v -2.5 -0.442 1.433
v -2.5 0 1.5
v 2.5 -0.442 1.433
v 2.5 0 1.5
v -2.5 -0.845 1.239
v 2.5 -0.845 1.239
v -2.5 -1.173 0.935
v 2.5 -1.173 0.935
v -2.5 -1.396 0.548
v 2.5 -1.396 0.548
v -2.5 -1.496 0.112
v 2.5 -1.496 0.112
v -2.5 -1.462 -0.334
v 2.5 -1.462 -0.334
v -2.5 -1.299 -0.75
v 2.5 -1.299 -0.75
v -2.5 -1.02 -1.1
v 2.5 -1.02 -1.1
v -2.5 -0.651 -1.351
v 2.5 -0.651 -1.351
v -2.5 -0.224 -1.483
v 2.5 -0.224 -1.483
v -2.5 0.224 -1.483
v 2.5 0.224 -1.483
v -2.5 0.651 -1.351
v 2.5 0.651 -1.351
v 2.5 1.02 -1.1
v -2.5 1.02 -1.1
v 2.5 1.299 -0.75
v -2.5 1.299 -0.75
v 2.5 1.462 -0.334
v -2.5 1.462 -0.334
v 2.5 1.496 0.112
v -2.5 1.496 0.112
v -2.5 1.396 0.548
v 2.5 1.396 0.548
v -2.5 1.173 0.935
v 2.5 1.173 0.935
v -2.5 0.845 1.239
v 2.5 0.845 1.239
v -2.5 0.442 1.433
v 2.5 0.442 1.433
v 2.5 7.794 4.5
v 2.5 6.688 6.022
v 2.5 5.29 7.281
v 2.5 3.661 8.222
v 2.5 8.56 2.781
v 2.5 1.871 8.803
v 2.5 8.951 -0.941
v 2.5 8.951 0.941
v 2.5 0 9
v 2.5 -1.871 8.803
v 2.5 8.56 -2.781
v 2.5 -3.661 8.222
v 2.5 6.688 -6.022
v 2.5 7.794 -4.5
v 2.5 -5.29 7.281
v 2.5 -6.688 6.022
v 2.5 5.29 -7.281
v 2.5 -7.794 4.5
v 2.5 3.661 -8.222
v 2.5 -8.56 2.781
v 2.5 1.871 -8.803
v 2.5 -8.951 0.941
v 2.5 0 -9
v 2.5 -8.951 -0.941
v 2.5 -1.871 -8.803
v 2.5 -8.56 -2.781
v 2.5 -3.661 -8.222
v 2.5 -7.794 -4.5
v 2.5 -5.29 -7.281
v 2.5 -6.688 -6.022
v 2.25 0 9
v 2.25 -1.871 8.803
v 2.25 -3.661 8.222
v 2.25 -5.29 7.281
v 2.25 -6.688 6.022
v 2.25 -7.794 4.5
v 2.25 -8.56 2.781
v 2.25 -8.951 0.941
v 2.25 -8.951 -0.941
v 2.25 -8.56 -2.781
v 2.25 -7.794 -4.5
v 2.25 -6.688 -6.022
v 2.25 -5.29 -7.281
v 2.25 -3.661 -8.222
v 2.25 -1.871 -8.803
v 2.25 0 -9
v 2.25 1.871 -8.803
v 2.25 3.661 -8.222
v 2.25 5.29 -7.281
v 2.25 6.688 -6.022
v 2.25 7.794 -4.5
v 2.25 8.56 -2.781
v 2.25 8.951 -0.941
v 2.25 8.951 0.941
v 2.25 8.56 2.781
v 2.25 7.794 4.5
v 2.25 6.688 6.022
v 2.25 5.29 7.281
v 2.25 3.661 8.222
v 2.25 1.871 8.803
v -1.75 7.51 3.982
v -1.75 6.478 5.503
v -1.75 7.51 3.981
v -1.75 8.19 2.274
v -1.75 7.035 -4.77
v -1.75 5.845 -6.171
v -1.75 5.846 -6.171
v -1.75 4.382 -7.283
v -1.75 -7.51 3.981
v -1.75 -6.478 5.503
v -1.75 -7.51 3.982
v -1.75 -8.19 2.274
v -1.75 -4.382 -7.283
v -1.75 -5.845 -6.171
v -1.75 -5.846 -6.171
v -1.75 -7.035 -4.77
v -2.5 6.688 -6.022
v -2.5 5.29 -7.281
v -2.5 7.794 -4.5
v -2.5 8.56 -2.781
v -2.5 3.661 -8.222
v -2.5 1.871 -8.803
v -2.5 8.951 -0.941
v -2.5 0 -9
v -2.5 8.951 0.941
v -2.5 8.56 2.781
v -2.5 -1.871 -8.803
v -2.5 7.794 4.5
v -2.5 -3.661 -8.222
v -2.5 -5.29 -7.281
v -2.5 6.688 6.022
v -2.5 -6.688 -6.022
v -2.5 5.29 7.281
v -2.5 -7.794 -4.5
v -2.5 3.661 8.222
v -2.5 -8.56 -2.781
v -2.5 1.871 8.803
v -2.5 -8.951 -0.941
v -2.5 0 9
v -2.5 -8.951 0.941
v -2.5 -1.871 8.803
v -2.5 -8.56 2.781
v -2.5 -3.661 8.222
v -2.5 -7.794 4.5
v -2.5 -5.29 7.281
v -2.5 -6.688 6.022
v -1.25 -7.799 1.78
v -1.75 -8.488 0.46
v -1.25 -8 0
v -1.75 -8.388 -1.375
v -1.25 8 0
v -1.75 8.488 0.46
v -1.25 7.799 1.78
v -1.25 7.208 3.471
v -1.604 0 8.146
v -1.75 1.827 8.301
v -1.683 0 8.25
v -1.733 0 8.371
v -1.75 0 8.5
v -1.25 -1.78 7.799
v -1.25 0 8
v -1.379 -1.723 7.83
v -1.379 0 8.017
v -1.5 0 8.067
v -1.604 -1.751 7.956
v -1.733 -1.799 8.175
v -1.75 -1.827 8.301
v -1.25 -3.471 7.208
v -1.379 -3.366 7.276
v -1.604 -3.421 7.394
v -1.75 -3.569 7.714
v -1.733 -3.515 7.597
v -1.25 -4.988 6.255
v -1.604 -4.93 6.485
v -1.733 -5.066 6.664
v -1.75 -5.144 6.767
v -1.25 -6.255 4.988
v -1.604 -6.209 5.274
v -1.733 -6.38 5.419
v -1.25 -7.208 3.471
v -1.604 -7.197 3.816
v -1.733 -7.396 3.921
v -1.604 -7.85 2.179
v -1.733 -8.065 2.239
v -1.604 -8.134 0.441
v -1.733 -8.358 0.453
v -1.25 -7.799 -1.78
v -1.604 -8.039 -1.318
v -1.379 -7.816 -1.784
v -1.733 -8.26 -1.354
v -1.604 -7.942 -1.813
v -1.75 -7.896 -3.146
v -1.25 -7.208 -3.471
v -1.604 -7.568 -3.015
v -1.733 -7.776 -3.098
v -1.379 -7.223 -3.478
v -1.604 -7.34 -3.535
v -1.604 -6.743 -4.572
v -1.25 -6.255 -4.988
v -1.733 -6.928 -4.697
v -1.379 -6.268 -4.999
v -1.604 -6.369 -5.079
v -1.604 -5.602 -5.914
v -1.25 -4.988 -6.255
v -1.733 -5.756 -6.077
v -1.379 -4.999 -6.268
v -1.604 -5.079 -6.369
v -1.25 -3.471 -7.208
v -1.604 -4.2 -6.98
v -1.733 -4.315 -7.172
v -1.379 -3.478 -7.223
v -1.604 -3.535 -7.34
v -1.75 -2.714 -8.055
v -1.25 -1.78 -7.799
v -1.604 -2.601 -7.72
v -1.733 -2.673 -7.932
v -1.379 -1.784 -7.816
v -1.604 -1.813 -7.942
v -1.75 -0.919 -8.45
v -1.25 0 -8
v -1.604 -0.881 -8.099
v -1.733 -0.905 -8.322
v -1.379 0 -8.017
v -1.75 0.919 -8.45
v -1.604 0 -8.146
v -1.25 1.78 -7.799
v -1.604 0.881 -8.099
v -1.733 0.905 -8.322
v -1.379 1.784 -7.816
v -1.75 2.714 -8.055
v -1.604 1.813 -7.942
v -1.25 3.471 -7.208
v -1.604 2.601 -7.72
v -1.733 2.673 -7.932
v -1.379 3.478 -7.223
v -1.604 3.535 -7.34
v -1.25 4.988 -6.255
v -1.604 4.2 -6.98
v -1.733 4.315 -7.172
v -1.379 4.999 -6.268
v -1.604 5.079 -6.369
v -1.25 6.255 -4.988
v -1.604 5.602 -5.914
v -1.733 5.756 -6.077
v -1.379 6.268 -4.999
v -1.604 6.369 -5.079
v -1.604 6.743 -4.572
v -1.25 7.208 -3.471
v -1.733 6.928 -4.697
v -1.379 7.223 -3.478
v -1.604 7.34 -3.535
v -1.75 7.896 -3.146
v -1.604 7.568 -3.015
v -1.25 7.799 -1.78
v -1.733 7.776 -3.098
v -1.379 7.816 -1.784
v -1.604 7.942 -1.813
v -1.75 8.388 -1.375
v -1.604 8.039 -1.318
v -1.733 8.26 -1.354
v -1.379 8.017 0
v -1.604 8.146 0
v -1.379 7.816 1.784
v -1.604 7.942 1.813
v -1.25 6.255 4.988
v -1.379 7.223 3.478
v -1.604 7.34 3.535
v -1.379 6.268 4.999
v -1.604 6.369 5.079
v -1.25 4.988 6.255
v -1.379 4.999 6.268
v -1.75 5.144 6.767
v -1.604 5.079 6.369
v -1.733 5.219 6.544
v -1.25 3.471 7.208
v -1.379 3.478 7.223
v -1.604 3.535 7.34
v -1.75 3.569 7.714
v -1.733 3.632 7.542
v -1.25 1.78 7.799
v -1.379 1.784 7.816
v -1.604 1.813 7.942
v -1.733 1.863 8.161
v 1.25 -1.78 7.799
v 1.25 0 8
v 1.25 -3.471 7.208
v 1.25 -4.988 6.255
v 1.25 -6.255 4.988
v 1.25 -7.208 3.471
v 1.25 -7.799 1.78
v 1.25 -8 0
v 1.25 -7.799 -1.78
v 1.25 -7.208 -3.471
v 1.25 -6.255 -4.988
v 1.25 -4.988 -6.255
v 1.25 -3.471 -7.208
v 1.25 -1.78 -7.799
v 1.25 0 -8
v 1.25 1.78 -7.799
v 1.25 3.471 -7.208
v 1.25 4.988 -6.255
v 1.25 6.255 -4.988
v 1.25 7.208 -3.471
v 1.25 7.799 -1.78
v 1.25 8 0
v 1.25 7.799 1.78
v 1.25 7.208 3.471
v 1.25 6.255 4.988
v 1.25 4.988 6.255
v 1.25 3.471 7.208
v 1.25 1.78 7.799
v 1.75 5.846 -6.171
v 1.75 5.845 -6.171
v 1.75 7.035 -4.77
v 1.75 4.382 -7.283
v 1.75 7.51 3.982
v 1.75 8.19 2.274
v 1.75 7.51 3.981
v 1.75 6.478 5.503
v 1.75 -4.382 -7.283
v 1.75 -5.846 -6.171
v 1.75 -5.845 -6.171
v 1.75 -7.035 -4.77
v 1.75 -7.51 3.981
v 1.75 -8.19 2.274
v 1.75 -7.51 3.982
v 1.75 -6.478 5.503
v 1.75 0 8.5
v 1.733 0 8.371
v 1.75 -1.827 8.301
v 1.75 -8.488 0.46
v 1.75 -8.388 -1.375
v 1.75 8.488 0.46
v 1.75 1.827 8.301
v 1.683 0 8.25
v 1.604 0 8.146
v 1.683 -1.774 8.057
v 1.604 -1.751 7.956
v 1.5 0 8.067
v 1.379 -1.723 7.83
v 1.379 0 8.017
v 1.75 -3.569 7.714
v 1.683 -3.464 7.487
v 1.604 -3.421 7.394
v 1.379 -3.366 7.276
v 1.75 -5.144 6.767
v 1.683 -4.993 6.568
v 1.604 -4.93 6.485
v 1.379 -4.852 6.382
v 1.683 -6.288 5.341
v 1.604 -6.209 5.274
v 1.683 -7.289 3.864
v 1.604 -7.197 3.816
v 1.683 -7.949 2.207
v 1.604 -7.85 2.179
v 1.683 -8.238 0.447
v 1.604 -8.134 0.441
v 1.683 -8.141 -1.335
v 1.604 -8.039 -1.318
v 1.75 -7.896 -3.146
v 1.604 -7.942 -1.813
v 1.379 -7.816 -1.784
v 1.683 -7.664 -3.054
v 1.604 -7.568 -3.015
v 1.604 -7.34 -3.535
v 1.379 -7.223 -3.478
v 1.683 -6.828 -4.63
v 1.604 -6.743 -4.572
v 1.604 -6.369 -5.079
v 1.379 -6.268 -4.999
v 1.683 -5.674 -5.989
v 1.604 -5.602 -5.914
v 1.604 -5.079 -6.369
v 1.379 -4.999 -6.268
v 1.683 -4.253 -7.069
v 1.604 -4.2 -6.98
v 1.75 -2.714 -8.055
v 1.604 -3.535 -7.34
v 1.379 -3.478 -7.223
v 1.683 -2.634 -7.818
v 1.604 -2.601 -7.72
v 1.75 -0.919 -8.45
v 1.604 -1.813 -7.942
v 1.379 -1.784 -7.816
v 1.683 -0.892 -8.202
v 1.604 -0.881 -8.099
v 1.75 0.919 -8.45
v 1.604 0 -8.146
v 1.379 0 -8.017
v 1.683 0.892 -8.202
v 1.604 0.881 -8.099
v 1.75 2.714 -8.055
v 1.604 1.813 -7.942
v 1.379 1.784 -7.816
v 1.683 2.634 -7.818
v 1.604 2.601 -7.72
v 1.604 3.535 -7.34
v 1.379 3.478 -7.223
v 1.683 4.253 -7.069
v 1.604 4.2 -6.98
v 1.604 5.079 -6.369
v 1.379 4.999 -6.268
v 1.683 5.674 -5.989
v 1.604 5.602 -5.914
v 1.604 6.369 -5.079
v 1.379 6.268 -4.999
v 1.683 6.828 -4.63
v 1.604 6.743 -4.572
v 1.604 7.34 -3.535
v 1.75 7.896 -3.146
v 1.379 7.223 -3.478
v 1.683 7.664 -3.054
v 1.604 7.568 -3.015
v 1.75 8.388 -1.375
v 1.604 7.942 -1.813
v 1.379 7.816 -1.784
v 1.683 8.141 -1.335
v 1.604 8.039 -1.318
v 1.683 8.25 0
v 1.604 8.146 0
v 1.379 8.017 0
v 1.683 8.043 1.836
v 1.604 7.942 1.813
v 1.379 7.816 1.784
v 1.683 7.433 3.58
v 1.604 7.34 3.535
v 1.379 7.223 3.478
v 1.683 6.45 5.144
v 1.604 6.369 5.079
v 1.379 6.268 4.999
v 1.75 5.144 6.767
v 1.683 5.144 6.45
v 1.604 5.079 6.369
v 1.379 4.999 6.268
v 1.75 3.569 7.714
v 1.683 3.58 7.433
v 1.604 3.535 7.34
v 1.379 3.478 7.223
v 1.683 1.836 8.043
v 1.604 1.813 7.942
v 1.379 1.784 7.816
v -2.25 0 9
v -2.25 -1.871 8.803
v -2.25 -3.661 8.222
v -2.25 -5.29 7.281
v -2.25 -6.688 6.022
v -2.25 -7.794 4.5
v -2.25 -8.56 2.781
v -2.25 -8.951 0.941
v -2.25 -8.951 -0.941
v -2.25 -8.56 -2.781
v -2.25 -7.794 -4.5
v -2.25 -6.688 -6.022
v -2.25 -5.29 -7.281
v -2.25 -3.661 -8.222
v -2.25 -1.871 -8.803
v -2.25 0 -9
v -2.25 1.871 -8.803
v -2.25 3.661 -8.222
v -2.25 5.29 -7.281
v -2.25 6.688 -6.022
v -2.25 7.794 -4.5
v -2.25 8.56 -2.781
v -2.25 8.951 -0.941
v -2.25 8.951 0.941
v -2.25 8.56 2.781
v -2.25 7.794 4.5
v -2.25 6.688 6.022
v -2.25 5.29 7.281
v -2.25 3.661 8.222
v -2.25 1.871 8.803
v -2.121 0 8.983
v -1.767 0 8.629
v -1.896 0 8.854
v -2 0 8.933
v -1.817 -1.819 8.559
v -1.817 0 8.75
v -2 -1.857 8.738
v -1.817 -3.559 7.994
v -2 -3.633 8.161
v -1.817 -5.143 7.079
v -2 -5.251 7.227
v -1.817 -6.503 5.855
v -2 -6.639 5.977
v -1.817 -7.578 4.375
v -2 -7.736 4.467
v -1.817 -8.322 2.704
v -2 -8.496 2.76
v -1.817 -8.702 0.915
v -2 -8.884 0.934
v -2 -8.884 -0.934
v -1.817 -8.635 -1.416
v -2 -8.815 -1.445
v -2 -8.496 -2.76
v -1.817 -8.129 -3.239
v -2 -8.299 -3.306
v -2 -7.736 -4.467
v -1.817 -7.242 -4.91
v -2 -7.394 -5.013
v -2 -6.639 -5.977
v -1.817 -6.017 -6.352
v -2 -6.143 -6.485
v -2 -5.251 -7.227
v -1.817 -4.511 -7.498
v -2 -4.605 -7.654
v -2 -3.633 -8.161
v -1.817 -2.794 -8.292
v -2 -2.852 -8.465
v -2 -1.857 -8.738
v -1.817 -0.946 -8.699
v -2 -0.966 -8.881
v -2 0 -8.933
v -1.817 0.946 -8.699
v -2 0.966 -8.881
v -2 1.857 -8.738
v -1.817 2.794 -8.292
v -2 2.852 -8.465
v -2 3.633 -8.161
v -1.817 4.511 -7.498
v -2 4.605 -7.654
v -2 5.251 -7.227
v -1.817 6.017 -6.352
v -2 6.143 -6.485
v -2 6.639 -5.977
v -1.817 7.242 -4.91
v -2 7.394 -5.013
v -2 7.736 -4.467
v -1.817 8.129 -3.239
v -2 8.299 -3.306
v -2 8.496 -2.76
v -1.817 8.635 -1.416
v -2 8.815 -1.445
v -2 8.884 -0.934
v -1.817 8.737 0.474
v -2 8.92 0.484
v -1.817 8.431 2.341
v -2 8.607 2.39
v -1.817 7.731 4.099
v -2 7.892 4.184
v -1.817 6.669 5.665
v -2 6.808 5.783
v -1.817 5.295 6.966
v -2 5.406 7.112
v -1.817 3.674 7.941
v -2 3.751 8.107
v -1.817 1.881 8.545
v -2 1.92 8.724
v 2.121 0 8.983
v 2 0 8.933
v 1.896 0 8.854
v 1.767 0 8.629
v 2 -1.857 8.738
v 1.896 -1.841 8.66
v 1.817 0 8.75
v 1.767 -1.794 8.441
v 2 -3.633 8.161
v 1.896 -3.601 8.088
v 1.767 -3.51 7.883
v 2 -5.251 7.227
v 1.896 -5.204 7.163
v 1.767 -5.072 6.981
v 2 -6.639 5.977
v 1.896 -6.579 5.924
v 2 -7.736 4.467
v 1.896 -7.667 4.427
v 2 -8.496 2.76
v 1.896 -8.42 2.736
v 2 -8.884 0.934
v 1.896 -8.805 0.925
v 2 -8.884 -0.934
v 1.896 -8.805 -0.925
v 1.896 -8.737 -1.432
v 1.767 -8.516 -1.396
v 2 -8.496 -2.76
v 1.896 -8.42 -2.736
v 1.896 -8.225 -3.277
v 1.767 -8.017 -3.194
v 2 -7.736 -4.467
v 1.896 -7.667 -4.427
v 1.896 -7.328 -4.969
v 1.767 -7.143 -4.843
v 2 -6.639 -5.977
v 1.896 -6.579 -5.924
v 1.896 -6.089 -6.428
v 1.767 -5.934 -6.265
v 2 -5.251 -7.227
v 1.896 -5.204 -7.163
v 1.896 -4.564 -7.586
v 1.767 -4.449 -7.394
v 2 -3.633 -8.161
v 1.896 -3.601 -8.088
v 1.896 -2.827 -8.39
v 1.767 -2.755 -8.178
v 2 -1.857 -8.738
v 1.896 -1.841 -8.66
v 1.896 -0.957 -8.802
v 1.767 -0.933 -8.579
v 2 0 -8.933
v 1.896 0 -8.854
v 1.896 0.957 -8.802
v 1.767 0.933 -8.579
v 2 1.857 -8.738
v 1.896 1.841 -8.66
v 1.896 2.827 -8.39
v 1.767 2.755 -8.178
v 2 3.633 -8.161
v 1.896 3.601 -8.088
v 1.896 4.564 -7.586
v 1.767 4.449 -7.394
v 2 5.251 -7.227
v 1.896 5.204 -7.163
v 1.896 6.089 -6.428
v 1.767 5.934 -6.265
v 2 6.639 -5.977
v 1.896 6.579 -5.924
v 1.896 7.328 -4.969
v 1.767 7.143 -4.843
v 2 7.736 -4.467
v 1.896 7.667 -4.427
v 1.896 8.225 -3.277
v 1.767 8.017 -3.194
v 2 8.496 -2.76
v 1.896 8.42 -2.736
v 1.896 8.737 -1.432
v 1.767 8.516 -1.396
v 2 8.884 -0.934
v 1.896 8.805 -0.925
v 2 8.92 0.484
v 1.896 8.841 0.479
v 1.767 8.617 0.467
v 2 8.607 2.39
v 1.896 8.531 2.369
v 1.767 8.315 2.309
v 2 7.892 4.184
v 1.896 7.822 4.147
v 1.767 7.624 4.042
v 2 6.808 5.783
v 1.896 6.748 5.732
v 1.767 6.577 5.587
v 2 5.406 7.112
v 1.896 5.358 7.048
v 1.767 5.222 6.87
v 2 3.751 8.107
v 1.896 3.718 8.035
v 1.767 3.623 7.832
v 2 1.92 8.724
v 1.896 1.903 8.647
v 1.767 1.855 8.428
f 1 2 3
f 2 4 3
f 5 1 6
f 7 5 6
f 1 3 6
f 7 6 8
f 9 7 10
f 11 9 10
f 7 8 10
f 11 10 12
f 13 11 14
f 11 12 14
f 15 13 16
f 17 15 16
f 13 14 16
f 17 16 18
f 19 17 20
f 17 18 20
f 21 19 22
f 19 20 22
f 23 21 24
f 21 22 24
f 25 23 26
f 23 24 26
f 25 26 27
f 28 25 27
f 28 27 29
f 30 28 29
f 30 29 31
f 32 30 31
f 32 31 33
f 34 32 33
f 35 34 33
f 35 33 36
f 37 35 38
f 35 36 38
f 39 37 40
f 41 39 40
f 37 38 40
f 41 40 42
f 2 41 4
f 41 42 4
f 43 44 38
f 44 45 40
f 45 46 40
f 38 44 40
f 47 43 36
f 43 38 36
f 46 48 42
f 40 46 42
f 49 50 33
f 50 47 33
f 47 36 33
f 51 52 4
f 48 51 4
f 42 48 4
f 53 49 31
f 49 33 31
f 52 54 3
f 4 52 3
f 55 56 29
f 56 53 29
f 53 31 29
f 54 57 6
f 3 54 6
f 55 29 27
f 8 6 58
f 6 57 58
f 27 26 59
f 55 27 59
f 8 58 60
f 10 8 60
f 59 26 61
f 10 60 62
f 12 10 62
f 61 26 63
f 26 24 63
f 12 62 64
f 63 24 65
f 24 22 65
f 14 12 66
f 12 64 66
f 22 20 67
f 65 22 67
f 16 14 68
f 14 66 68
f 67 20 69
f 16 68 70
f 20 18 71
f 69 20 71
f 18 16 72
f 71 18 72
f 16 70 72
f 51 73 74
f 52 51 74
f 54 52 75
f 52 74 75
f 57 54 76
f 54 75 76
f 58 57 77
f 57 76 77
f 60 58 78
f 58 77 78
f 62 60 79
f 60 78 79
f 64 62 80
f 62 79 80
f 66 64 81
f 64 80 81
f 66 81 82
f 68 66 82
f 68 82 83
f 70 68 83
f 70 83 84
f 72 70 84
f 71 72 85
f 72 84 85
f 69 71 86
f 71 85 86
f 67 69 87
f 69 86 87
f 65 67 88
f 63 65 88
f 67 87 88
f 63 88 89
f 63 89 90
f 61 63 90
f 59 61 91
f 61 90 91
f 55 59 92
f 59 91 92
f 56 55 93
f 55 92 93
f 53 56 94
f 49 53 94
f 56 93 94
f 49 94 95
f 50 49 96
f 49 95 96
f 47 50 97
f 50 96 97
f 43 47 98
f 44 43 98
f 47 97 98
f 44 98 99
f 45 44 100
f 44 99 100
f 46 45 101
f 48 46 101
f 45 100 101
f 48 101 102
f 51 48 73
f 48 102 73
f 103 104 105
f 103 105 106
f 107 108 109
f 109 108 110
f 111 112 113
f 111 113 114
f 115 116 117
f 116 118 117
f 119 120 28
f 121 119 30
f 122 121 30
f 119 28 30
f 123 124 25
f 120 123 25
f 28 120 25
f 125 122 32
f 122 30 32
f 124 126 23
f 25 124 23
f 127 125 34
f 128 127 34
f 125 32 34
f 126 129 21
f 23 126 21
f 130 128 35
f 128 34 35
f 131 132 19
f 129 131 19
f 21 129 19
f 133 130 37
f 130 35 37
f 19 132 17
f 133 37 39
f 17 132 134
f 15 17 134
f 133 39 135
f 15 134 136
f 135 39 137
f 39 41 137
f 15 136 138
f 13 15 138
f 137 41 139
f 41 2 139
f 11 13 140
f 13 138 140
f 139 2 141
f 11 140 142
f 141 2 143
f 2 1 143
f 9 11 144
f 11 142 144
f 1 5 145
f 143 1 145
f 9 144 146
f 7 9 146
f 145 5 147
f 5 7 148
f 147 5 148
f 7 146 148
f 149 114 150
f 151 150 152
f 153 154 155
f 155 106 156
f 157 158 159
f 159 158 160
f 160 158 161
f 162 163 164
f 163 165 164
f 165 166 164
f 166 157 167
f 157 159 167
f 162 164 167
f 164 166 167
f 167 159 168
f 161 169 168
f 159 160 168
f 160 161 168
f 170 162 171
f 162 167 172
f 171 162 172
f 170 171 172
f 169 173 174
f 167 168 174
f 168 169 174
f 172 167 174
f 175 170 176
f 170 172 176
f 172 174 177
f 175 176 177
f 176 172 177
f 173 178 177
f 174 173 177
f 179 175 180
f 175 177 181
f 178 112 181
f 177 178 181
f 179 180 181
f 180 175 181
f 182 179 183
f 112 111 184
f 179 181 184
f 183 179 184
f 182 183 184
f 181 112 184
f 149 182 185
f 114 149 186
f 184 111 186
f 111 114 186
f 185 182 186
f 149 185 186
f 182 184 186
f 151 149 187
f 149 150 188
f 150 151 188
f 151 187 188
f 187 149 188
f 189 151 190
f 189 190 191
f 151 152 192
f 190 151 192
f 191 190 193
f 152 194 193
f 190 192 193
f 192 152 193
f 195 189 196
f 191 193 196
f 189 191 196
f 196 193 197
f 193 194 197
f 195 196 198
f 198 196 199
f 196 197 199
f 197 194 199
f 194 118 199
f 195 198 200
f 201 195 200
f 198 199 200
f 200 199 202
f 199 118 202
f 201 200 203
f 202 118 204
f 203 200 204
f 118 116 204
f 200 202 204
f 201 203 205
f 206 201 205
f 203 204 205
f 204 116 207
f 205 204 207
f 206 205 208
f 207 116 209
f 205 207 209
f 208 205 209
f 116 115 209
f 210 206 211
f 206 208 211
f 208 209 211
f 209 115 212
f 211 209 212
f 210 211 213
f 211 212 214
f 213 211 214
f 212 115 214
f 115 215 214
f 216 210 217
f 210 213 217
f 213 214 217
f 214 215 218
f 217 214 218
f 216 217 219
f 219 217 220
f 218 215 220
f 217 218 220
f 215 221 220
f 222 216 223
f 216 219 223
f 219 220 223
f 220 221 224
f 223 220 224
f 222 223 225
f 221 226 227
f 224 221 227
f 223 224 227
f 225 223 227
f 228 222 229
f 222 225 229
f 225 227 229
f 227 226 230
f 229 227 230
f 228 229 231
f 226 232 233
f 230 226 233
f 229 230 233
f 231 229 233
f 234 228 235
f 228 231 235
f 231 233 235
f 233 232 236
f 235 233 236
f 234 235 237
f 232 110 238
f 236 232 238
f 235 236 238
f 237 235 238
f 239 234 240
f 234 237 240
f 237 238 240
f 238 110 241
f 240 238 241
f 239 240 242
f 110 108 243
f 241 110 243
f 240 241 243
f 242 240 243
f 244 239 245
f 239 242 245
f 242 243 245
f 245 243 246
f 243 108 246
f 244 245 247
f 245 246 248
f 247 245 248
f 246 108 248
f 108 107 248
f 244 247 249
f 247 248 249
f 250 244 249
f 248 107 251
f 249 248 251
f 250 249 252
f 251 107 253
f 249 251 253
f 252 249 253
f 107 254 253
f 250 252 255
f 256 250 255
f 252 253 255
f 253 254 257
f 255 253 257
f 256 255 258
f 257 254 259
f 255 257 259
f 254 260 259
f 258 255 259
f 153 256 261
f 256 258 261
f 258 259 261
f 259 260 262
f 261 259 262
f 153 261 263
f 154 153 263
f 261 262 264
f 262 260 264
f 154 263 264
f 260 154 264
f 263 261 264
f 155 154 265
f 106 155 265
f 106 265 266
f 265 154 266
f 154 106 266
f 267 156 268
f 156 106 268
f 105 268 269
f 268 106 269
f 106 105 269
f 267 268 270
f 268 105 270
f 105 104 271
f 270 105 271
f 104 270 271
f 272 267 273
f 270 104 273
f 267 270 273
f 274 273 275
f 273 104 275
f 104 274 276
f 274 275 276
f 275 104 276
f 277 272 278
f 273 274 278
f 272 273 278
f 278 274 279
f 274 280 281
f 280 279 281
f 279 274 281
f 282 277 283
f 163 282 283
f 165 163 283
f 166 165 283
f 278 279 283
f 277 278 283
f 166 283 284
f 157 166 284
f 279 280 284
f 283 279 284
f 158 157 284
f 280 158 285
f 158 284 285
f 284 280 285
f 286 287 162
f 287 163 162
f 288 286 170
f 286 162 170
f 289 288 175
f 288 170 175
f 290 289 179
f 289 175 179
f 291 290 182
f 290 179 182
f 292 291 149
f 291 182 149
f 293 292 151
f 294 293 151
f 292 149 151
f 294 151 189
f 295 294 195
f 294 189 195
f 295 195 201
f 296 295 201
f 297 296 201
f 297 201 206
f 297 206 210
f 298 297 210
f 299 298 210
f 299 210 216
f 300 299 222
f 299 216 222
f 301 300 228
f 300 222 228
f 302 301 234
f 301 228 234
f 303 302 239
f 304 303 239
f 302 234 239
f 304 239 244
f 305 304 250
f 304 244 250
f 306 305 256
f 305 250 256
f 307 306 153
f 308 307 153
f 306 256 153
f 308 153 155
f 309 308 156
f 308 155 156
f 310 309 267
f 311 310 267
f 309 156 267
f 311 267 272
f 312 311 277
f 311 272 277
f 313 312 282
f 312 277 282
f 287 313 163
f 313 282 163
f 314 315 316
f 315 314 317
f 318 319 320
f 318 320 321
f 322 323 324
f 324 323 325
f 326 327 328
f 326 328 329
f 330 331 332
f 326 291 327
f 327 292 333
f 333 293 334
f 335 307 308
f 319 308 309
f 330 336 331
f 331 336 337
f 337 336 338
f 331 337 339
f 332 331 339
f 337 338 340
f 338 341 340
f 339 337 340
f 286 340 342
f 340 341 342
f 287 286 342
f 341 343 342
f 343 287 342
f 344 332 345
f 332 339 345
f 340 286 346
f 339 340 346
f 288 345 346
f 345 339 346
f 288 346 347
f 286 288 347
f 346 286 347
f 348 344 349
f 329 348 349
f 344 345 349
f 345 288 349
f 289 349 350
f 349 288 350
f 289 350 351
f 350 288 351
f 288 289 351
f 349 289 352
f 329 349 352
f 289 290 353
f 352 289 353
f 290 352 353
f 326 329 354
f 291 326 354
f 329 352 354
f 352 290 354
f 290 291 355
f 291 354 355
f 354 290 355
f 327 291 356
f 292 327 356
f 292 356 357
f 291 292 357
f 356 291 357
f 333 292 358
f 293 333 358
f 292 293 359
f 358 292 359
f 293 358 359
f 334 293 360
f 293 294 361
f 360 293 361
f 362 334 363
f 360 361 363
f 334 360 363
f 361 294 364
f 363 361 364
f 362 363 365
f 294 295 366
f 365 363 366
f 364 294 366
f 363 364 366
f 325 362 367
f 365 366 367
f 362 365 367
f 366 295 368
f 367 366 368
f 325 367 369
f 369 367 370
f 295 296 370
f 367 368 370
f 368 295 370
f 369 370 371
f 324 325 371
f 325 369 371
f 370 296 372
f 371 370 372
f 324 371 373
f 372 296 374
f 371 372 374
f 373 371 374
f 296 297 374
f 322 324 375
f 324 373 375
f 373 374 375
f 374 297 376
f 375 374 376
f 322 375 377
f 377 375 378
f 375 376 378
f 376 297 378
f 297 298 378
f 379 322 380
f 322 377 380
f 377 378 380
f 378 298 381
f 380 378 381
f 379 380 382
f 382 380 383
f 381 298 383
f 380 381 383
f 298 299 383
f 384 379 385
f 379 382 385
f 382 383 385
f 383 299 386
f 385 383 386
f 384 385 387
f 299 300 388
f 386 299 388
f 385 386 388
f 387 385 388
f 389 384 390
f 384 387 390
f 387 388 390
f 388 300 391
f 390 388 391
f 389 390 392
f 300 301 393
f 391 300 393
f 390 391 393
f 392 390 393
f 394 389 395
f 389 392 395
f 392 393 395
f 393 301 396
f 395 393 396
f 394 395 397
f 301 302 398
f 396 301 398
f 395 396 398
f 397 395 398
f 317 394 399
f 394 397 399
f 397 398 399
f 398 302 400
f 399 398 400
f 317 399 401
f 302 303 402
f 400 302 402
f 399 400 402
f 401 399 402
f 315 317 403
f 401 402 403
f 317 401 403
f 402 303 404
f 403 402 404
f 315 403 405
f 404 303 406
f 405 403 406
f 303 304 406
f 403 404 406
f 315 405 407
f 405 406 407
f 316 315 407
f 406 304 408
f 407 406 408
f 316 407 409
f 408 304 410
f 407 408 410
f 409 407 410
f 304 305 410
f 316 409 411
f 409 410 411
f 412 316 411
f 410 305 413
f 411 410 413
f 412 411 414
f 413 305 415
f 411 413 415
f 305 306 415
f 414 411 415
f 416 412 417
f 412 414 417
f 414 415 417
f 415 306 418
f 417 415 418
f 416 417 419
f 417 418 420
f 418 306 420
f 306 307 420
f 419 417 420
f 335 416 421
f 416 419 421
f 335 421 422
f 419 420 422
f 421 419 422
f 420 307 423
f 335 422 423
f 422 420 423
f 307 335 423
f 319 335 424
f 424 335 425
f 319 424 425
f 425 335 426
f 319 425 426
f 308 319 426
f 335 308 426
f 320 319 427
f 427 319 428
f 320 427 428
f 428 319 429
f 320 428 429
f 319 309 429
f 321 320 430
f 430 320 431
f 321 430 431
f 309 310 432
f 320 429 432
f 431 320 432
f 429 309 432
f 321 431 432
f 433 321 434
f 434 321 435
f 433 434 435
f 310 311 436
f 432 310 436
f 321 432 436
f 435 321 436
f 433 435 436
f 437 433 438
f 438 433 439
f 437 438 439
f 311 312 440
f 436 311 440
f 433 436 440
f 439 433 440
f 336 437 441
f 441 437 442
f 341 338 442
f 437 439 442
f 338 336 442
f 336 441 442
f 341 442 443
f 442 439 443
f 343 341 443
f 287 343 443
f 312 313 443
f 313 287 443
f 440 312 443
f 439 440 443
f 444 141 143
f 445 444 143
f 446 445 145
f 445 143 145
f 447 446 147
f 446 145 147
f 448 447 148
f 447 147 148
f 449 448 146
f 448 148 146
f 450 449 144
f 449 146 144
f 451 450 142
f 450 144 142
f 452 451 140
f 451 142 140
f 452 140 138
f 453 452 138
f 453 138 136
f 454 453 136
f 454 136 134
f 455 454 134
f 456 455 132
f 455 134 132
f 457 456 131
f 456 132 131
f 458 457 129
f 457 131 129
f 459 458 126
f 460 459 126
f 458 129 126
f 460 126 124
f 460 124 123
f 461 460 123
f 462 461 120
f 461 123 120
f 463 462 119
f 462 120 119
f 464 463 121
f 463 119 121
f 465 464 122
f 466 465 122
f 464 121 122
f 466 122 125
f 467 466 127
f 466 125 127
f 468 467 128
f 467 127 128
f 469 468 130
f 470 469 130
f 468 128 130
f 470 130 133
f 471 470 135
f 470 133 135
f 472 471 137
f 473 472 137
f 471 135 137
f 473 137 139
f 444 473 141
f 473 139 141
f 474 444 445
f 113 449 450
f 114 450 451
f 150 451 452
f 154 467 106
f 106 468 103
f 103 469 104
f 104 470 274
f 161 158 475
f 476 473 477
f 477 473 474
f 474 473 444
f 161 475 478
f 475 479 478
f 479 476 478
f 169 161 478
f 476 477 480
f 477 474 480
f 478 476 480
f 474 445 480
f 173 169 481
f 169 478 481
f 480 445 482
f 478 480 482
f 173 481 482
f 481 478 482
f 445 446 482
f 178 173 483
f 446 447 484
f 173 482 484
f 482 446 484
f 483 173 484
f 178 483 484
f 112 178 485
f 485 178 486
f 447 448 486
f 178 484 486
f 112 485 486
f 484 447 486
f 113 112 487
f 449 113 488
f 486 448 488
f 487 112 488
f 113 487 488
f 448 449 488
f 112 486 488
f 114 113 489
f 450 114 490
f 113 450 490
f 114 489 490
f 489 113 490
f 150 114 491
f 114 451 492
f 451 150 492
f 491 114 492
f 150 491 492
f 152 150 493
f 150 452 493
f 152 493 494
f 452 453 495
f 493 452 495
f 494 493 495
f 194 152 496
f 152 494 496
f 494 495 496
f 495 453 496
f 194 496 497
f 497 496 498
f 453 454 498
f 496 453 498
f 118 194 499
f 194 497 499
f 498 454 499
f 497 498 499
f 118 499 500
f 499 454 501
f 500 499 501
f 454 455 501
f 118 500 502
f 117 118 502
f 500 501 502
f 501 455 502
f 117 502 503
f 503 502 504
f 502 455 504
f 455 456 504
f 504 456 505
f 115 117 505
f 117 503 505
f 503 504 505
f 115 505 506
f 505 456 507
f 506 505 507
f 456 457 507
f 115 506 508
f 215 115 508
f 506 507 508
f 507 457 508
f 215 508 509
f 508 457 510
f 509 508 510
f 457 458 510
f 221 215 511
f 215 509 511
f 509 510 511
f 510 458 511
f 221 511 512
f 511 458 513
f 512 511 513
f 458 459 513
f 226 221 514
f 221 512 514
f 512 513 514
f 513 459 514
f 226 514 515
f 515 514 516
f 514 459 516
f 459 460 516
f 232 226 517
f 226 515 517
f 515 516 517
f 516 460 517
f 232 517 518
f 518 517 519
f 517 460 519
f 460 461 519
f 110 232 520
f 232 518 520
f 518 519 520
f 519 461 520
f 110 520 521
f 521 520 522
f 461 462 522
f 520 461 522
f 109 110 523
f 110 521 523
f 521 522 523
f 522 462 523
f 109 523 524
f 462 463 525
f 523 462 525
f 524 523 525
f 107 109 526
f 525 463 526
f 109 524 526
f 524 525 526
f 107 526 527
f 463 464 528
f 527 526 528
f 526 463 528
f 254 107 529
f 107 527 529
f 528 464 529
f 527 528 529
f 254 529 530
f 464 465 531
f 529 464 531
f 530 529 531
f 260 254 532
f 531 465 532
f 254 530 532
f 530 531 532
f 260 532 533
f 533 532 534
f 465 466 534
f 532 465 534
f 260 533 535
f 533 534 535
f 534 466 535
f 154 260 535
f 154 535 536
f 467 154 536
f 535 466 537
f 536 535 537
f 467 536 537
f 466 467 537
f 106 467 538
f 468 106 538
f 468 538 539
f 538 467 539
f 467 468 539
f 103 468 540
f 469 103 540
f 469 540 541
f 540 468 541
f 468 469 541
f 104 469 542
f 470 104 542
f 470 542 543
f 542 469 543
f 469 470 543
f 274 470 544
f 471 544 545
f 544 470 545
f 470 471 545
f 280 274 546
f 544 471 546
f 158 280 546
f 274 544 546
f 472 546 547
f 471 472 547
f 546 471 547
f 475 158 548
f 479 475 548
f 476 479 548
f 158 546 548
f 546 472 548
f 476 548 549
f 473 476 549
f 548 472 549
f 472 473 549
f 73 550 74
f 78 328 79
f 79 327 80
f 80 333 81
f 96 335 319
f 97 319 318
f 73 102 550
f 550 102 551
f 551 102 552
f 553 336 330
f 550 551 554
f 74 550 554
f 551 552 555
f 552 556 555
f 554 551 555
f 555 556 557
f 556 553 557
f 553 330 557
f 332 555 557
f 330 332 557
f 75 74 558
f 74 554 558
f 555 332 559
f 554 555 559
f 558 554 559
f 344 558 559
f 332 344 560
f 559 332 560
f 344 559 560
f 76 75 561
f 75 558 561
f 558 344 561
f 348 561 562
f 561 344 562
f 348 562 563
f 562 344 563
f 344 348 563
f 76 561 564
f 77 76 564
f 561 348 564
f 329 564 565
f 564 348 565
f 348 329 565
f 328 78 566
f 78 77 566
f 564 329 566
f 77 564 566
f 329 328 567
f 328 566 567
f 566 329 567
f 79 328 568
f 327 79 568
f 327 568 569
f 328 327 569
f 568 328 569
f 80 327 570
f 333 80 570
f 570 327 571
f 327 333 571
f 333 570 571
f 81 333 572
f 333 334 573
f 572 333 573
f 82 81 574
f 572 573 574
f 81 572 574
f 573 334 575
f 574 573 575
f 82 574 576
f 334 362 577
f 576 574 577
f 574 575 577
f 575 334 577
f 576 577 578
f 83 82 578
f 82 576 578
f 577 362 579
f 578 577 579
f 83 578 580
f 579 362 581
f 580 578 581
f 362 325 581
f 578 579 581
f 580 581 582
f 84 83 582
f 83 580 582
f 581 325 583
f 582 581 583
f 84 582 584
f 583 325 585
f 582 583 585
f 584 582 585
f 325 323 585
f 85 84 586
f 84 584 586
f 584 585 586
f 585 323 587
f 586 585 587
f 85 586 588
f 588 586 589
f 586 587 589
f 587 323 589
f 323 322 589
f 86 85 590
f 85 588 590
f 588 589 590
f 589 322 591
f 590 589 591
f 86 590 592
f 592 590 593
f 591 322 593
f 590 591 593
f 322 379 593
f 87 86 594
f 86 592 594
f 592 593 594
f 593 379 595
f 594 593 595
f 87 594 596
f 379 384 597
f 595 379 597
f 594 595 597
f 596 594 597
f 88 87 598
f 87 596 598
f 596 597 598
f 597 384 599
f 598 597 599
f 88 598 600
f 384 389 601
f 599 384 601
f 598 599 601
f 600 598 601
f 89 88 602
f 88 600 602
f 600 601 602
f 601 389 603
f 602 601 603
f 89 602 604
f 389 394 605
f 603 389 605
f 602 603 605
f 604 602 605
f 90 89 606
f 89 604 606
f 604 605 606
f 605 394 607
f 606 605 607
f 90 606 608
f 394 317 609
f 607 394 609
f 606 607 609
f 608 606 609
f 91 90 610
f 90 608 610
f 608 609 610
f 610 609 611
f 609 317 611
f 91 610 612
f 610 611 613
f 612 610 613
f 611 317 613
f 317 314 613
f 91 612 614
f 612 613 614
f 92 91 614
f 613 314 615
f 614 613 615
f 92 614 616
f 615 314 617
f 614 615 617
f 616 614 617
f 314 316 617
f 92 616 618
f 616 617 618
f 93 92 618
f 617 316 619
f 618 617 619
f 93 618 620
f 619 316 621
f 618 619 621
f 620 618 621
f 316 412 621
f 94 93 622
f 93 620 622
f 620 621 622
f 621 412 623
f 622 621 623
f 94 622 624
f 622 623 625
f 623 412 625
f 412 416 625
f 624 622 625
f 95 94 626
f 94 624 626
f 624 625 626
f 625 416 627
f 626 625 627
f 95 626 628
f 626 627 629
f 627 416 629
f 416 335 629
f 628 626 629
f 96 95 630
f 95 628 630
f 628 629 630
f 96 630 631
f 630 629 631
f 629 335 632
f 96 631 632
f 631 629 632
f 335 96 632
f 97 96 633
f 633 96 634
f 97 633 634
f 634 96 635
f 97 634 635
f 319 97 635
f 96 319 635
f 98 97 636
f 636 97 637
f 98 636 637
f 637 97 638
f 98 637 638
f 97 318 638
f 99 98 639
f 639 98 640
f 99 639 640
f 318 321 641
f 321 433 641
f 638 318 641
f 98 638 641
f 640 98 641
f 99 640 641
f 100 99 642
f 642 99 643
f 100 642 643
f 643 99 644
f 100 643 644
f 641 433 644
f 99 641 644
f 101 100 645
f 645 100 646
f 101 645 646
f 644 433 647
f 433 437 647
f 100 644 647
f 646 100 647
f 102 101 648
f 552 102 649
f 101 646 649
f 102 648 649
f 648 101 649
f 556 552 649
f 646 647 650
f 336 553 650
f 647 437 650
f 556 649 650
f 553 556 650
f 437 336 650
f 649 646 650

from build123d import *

# Parameters (mm, degrees)
FILLET1_R = 0.5


with BuildPart() as part:
    # Sketch1 → Revolve1 (revolve)
    with BuildSketch(Plane.XY, mode=Mode.PRIVATE) as revolve1_sk:
        with BuildLine():
            Line((-2.5, 1.5), (2.5, 1.5))
            Line((2.5, 1.5), (2.5, 9))
            Line((2.5, 9), (1.75, 9))
            Line((1.75, 9), (1.75, 8.5))
            ThreePointArc((1.75, 8.5), (1.603553391, 8.146446609), (1.25, 8))
            Line((1.25, 8), (-1.25, 8))
            ThreePointArc((-1.25, 8), (-1.603553391, 8.146446609), (-1.75, 8.5))
            Line((-1.75, 8.5), (-1.75, 9))
            Line((-1.75, 9), (-2.5, 9))
            Line((-2.5, 9), (-2.5, 1.5))
        make_face()
    revolve(revolve1_sk.sketch.rotate(Axis((0, 0, 0), (1, 0, 0)), 90), axis=Axis((0, 0, 0), (1, 0, 0)))

    # Fillet1
    fillet1_edges = [part.edges().sort_by_distance(p)[0] for p in [
        (1.75, 0, -9),
        (-1.75, 0, -9),
    ]]
    fillet(fillet1_edges, radius=FILLET1_R - 0.0001)  # a hair under: the kernel refuses the full size


solid = part.part
